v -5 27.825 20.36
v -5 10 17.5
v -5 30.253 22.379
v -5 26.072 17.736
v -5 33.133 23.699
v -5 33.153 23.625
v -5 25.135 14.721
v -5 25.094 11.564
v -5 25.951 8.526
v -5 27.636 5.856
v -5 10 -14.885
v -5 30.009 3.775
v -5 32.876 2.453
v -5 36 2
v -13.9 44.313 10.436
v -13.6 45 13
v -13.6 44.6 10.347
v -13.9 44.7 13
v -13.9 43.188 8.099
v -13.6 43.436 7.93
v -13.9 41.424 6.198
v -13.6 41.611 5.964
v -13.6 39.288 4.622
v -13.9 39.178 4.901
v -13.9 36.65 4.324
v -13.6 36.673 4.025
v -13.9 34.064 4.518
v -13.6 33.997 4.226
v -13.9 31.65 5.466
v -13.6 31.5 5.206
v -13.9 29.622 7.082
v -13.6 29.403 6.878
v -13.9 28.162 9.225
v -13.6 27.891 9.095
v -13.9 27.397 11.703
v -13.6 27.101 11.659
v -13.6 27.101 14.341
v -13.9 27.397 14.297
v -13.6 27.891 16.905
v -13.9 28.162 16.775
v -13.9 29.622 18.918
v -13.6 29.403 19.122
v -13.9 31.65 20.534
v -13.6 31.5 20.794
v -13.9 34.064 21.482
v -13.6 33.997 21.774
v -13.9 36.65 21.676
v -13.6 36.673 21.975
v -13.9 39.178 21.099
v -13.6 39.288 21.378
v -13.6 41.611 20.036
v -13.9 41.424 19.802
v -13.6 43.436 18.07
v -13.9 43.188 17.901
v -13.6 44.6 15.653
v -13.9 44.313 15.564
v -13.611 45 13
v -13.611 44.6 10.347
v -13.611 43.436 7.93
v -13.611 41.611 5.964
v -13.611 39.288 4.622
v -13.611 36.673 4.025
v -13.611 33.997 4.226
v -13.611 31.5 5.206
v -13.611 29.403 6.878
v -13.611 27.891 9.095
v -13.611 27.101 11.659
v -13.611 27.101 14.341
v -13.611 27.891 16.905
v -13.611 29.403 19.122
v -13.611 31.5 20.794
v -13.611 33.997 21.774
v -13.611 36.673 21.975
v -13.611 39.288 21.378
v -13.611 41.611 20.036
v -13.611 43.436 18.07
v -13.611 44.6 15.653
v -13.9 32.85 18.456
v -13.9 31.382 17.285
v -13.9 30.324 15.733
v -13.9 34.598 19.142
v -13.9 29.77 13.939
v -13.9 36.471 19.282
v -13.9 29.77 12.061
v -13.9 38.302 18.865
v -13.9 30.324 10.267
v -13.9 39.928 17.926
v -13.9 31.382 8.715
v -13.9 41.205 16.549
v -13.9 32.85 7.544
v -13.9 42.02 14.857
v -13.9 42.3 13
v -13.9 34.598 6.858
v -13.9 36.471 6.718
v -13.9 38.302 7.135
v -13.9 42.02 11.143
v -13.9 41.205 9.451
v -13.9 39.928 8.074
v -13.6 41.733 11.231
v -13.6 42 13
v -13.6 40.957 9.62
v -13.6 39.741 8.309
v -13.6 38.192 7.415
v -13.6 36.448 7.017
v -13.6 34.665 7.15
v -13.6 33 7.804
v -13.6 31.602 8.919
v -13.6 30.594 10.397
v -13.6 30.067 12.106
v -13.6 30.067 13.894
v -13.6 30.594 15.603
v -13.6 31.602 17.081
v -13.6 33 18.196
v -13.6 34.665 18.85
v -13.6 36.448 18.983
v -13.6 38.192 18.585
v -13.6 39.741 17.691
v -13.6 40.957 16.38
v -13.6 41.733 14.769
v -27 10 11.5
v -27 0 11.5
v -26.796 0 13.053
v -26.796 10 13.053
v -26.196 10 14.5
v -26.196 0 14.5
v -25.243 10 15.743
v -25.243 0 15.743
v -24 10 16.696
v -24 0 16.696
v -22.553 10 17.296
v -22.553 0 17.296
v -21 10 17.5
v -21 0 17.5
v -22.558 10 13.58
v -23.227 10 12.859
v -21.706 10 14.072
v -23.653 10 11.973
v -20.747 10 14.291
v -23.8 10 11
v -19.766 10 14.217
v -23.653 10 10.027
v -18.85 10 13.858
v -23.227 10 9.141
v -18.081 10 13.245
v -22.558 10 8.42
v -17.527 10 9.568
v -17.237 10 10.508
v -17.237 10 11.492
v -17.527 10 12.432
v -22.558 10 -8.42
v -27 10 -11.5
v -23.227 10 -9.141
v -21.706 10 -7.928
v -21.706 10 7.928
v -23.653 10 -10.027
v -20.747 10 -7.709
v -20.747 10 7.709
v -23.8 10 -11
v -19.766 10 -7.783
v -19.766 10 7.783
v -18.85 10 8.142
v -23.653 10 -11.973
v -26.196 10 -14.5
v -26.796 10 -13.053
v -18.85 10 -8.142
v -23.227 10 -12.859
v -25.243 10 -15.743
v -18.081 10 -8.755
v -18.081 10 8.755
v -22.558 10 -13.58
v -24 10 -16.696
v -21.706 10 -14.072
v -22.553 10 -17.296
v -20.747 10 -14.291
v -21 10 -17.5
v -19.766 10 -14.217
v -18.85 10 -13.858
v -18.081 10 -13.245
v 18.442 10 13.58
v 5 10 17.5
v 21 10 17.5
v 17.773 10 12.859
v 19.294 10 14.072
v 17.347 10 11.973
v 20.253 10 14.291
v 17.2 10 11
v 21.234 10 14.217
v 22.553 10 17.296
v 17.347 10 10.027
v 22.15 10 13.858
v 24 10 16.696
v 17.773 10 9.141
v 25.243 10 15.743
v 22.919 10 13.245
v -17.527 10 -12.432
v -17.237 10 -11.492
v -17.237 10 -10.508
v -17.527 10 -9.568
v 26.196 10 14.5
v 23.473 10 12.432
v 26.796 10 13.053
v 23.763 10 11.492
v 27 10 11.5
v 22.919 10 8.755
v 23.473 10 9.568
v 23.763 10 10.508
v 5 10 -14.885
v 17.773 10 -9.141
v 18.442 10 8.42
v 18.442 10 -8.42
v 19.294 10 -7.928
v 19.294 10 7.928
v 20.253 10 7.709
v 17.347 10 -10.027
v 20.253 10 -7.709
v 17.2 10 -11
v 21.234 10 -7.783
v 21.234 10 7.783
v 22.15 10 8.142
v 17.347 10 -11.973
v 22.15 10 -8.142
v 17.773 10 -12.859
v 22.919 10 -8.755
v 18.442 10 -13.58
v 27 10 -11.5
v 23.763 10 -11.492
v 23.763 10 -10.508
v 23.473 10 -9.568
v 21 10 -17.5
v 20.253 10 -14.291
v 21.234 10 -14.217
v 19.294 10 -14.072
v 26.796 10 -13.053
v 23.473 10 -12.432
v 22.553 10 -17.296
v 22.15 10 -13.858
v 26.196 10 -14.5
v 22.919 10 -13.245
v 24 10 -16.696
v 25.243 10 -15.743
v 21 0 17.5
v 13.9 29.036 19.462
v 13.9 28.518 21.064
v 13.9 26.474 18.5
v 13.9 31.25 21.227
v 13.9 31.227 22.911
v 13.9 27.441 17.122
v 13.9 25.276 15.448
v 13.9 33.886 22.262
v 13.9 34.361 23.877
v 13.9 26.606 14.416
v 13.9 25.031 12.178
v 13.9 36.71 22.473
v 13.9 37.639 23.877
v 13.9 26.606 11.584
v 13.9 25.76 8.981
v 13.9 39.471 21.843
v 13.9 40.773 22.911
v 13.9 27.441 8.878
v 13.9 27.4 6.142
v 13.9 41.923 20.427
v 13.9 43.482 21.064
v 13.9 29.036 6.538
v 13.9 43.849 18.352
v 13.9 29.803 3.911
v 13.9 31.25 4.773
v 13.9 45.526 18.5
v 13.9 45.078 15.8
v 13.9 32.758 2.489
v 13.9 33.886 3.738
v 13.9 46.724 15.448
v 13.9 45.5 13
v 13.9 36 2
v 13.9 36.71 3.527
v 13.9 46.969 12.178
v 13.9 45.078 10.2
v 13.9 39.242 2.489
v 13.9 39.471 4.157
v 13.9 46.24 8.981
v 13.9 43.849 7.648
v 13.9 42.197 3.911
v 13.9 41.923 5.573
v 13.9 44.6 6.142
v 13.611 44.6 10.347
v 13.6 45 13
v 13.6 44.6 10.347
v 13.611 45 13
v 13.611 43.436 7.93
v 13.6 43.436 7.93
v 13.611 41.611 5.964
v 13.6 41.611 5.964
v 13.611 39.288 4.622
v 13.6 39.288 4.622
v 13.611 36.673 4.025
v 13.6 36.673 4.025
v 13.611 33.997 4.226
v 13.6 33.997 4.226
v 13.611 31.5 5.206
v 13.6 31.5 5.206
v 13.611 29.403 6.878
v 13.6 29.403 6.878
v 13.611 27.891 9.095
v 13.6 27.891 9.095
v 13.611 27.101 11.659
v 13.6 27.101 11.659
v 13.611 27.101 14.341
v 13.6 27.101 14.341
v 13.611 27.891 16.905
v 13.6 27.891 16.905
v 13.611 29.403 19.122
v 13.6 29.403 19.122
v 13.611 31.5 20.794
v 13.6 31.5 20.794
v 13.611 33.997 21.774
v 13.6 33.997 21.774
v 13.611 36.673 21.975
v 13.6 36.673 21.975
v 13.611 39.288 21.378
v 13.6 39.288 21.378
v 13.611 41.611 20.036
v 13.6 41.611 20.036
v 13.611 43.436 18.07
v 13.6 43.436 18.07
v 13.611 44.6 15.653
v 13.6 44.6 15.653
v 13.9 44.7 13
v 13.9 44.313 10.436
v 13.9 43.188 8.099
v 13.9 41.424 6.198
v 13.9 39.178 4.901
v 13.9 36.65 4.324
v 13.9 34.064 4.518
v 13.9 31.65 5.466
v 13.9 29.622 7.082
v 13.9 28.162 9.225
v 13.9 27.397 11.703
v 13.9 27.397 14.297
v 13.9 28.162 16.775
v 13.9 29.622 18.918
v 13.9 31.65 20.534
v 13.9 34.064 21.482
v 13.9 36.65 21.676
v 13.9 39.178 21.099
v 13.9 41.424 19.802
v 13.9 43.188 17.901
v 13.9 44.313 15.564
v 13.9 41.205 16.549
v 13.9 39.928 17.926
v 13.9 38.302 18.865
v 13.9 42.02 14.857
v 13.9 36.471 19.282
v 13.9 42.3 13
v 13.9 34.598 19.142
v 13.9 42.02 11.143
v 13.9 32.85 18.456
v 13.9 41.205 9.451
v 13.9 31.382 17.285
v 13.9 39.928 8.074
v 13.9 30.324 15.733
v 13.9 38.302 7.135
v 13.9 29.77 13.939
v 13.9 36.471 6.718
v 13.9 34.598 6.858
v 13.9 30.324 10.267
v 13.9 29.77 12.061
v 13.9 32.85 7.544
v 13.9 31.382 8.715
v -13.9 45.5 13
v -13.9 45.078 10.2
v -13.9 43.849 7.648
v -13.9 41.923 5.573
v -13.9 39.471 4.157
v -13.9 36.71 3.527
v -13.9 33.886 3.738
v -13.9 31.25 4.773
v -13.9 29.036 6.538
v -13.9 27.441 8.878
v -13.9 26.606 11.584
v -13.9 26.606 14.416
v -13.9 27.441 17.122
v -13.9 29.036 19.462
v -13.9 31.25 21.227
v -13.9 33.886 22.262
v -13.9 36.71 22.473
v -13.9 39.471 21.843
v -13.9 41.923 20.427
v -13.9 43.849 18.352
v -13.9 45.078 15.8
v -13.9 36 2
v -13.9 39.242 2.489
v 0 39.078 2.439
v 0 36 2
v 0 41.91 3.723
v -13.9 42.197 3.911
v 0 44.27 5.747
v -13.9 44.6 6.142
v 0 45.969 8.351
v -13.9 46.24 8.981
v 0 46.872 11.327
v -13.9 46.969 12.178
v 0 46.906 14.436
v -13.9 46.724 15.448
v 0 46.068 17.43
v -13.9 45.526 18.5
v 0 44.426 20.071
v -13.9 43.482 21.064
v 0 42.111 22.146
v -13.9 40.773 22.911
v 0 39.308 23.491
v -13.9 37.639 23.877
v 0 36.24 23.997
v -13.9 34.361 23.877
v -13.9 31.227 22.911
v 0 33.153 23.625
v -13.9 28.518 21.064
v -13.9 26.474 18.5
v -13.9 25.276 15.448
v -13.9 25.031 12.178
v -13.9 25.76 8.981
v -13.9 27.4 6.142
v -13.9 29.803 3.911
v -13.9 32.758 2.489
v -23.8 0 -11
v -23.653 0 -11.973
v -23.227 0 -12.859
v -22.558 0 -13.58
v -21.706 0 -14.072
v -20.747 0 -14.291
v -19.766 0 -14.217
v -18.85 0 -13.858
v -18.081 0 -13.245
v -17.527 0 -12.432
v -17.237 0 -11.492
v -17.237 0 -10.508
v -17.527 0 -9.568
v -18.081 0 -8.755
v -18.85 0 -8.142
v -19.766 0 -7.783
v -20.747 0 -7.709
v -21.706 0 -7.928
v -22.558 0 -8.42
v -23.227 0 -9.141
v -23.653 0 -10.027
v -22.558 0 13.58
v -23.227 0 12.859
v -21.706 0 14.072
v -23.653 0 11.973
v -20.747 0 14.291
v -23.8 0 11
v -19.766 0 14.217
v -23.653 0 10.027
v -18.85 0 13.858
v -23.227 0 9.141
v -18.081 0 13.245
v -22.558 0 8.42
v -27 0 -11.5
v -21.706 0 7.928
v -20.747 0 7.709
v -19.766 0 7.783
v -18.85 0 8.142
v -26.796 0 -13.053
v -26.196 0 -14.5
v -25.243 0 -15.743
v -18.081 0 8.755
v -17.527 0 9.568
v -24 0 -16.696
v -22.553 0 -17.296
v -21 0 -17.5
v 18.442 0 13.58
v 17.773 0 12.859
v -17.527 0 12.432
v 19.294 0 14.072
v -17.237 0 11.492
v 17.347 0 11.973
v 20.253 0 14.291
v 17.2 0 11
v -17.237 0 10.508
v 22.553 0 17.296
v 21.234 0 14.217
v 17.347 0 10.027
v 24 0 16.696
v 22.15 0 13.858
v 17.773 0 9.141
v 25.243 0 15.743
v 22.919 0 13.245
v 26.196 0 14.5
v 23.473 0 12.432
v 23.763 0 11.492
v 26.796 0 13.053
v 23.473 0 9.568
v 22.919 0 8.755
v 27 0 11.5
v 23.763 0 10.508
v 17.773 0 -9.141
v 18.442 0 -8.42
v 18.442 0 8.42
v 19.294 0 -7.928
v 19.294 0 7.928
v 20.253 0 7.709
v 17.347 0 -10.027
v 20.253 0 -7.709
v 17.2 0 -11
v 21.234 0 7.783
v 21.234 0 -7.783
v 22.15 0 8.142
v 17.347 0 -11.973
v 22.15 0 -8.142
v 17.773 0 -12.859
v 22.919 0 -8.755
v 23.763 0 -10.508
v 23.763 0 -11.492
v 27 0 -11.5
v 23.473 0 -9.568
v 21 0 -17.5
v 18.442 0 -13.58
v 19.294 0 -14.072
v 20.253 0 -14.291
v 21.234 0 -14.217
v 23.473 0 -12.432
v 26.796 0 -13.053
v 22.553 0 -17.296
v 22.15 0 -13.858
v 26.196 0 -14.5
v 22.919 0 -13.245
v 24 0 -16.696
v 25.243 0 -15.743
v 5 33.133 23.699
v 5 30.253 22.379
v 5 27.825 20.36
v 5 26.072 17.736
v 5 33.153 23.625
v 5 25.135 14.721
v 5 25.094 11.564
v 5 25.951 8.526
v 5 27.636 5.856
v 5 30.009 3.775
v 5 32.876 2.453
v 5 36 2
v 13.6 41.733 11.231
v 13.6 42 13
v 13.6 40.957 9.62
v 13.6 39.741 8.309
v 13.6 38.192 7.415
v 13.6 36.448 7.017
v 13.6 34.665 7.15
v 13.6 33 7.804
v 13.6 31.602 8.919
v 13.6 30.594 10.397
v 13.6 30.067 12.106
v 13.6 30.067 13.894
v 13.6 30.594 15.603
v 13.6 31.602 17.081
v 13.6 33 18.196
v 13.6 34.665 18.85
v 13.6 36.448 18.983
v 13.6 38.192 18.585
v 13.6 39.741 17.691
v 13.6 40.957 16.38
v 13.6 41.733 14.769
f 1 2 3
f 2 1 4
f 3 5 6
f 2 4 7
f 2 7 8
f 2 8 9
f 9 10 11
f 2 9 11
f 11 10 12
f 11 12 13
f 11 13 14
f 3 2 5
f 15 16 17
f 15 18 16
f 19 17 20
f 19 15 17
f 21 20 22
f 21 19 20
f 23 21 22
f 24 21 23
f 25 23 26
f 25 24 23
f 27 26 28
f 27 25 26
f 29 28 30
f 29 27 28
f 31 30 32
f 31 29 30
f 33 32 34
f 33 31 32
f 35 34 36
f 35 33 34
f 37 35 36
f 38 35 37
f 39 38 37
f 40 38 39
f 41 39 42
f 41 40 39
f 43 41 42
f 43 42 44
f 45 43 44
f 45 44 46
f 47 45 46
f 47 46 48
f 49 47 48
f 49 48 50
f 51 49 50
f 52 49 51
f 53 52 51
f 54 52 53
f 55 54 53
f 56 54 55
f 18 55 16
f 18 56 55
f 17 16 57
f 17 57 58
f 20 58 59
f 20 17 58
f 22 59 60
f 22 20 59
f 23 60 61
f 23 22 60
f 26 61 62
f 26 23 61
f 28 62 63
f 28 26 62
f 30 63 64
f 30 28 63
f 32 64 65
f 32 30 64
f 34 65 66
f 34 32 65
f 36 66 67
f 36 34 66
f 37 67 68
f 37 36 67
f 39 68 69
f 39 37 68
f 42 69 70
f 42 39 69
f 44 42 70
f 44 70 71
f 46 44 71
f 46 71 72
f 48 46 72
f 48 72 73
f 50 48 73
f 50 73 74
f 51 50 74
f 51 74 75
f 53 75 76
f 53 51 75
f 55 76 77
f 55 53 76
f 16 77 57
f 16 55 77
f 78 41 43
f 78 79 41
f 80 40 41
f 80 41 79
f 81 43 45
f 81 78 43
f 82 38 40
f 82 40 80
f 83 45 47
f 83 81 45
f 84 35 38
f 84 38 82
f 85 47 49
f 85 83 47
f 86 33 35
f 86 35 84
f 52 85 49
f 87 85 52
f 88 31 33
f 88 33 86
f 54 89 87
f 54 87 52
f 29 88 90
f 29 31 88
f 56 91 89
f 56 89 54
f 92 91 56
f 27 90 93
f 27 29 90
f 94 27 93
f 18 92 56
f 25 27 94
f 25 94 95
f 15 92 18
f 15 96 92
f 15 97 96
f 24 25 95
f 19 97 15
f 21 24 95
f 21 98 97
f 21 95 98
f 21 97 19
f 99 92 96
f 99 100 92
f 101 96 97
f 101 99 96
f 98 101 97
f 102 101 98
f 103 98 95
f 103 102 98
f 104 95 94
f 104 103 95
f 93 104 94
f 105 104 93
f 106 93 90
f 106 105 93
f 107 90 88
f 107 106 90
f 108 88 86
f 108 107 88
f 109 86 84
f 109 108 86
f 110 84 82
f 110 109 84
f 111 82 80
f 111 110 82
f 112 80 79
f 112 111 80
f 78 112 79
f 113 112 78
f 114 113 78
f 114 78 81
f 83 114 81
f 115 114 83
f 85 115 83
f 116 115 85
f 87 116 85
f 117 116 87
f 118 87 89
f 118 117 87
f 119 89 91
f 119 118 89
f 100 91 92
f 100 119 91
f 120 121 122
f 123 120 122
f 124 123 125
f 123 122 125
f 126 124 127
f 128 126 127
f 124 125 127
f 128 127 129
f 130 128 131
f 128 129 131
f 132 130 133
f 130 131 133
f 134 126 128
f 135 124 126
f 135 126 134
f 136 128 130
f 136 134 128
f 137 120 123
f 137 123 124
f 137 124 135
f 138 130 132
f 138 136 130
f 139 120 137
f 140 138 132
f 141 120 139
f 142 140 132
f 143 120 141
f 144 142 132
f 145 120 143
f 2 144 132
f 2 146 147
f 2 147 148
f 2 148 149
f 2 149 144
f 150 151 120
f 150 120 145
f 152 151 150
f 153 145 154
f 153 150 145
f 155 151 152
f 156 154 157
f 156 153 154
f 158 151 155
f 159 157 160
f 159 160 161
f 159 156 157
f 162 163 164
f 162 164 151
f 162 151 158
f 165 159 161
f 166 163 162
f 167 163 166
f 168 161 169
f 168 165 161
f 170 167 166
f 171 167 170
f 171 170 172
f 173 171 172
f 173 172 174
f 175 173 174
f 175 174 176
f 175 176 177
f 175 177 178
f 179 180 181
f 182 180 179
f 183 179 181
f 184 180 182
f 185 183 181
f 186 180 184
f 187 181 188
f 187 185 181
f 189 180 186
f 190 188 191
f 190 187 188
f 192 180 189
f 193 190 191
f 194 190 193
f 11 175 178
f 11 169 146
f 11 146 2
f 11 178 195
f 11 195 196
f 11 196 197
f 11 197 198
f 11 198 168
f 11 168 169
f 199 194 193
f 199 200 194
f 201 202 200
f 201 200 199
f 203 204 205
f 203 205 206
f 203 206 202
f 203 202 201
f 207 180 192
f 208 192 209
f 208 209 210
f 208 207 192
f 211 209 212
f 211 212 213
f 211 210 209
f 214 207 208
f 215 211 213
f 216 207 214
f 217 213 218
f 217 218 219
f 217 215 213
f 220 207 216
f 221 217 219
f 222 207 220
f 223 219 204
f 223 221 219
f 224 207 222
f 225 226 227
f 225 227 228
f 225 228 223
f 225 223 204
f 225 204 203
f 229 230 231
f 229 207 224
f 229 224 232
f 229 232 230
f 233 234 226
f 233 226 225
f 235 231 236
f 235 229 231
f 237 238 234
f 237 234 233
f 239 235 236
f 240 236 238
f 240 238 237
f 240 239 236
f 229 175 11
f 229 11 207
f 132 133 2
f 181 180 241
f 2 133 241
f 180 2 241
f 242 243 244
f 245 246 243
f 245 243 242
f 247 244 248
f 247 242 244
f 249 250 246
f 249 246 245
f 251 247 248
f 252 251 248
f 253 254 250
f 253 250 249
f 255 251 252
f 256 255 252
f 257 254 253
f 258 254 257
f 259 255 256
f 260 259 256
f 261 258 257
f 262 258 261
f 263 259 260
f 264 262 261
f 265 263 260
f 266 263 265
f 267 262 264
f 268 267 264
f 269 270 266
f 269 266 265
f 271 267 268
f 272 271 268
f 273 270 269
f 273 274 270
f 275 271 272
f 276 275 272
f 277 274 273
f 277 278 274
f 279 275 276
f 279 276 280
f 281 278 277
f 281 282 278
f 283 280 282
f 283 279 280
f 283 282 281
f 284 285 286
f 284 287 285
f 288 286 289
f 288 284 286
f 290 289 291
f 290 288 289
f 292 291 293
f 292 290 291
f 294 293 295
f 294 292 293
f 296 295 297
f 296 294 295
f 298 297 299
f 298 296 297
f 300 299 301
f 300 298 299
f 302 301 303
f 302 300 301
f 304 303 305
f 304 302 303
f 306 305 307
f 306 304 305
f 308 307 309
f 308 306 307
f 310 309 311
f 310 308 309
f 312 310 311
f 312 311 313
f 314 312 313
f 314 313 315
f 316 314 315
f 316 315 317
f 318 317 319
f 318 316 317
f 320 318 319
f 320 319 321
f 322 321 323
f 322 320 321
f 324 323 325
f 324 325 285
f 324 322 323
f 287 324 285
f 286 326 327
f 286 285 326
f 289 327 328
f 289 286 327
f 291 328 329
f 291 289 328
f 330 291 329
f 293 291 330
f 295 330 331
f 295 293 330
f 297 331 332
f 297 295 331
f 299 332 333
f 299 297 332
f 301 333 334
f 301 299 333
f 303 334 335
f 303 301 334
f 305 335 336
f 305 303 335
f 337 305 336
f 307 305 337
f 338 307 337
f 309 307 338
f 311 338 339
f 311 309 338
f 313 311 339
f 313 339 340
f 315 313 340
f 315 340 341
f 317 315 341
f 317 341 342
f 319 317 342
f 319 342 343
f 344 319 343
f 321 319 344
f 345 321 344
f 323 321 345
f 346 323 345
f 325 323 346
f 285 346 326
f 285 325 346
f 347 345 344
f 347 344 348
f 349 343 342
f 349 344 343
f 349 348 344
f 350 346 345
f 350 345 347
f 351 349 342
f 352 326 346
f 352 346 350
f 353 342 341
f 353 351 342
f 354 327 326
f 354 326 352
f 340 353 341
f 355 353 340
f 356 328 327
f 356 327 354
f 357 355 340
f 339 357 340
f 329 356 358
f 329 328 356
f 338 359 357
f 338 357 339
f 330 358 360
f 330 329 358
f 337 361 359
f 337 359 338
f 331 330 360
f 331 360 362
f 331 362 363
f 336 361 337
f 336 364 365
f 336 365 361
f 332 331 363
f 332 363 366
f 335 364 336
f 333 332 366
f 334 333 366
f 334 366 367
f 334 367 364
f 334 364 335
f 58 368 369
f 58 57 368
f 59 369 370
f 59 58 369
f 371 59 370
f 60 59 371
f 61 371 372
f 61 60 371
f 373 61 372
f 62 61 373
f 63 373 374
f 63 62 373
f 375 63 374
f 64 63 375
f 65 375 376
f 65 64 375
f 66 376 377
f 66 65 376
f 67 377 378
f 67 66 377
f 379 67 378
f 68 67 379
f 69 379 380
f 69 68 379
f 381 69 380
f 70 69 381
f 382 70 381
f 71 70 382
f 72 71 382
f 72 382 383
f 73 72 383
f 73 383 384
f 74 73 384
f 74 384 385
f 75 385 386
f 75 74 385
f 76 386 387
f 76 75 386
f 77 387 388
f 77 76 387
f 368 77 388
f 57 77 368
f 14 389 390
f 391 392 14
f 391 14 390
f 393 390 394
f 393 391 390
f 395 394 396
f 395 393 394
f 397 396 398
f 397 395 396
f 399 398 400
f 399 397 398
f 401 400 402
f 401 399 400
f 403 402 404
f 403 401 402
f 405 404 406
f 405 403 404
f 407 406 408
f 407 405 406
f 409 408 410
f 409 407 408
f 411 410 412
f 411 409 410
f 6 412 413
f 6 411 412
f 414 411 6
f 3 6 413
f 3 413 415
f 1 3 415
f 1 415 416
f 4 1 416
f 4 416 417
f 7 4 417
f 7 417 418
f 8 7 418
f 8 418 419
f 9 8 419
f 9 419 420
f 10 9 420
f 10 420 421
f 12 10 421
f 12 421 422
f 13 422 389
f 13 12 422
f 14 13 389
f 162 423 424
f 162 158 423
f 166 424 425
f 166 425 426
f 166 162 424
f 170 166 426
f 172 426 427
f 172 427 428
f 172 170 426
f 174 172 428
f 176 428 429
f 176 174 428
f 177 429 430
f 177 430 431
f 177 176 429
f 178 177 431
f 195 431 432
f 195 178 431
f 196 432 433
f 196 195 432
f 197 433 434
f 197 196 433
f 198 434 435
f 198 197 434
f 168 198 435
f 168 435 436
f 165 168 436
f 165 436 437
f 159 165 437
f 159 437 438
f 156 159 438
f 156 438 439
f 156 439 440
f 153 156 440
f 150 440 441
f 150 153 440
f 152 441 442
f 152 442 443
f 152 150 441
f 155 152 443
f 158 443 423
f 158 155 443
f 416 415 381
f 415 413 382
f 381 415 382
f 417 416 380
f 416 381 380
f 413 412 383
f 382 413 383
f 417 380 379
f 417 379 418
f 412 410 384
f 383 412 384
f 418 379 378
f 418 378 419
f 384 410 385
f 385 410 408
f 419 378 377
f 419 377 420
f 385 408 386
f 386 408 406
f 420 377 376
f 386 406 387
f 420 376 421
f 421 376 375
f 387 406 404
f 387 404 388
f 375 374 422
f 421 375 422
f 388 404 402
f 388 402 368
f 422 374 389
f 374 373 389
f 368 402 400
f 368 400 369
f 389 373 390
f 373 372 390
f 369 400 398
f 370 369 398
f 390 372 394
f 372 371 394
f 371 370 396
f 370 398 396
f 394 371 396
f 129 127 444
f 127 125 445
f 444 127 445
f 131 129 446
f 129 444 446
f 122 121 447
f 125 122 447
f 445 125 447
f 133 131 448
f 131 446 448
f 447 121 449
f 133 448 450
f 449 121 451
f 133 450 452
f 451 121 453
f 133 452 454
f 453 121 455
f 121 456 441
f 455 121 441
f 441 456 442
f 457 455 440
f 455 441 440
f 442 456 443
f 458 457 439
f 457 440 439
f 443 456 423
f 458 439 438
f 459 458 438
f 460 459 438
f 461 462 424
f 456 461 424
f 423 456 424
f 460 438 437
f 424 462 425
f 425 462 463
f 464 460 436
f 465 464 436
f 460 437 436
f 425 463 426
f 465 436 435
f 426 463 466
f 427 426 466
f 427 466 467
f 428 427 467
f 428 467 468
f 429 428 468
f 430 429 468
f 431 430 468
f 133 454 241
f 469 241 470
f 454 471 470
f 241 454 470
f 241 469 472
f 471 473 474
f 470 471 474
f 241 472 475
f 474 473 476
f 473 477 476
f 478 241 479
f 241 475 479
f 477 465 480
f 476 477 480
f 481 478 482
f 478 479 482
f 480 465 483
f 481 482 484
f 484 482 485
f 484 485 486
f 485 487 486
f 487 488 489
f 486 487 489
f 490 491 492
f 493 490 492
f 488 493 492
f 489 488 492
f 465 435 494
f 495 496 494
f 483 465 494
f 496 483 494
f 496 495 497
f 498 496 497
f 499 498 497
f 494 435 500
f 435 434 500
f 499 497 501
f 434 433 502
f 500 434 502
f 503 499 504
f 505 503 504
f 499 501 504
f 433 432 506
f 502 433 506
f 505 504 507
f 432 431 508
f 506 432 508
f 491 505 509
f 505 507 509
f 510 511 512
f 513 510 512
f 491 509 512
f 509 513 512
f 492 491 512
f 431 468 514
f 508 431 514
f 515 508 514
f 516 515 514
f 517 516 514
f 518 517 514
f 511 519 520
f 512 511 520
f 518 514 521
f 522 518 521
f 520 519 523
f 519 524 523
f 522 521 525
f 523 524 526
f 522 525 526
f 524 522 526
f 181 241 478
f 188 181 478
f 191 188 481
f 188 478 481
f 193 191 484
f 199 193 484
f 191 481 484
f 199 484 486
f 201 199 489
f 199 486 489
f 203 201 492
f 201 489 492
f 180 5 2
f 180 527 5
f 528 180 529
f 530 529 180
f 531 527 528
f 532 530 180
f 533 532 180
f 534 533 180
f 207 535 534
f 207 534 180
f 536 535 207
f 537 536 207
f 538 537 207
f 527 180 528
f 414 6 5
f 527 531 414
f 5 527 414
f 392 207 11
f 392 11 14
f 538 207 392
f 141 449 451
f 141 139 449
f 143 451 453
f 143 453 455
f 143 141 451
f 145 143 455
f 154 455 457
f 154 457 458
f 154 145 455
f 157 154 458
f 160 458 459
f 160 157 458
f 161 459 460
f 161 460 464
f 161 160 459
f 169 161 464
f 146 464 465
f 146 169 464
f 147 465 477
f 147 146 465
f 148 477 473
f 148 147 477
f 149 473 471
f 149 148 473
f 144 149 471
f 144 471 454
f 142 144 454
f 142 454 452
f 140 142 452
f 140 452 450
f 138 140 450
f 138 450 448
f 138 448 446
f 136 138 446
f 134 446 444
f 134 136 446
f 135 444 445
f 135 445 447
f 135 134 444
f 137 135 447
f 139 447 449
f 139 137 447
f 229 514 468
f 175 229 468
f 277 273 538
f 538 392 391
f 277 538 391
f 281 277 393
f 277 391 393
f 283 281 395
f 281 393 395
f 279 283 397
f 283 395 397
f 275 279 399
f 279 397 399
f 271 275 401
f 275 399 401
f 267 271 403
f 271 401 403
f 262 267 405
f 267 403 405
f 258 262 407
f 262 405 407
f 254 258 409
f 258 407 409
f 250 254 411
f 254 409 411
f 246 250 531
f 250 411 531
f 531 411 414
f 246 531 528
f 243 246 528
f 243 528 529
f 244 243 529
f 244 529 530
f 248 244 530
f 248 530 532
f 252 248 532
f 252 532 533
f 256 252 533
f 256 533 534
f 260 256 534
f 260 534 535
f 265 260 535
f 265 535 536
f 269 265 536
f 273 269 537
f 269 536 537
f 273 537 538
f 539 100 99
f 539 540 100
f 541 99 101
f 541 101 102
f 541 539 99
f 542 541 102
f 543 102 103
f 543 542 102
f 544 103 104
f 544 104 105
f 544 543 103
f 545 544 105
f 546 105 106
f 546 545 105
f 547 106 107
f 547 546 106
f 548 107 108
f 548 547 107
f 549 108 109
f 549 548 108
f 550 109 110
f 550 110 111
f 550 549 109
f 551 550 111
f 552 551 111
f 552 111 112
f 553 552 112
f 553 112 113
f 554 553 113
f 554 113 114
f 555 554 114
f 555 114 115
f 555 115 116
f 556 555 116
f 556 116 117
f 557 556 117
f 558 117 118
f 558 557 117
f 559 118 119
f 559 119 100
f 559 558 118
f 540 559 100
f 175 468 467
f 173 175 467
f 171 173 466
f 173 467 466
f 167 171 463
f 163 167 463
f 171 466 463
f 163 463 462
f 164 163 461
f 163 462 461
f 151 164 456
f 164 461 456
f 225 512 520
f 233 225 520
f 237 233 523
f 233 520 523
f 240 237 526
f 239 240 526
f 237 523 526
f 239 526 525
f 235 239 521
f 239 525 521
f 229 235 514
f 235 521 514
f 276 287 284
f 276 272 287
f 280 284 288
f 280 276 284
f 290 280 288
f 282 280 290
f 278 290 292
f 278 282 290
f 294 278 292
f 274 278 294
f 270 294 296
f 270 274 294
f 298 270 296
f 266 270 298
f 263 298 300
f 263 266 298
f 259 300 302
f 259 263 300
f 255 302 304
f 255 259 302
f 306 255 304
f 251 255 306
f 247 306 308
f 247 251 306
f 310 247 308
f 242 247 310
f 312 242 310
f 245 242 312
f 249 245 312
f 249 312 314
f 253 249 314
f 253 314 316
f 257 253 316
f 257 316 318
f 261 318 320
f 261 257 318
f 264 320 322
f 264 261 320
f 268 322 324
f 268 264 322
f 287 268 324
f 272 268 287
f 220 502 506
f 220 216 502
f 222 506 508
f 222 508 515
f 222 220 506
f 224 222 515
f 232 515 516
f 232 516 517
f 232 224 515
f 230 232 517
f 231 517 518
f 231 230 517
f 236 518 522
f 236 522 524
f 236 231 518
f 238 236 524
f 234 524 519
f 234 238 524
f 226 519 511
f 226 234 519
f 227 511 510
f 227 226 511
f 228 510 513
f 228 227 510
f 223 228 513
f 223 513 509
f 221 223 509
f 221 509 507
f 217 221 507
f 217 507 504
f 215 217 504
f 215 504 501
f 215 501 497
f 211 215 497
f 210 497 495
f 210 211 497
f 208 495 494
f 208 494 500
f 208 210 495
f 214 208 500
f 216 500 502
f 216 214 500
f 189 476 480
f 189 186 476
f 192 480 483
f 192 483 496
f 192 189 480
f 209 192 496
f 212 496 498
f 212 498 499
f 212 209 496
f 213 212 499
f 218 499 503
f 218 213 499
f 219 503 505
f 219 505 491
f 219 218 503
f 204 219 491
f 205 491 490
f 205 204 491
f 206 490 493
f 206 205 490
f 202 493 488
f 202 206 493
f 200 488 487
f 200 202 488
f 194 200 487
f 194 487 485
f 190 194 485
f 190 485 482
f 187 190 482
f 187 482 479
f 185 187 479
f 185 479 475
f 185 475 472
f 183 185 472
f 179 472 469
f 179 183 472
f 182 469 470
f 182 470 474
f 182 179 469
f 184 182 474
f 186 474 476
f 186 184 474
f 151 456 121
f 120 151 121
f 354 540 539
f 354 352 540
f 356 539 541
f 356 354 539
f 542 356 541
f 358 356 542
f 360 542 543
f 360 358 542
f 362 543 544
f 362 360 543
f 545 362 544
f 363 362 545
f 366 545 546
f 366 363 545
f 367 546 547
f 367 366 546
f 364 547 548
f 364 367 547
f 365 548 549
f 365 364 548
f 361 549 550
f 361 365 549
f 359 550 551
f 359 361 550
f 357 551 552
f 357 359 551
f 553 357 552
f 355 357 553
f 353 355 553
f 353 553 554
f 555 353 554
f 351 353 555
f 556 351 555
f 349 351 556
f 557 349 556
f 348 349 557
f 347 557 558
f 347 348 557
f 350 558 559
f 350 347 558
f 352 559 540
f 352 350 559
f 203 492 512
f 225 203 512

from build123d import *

# Parameters (mm, degrees)
BOSS_EXTRUDE1_DEPTH      = 10
BOSS_EXTRUDE2_DEPTH      = 5
BOSS_EXTRUDE2_DEPTH_BACK = 5
SKETCH3_R                = 11
BOSS_EXTRUDE3_DEPTH      = 13.9
BOSS_EXTRUDE3_DEPTH_BACK = 13.9
SKETCH4_W                = 3.3
SKETCH4_H                = 10
SKETCH5_W                = 3.3
SKETCH5_H                = 10
SKETCH6_W                = 3.3
SKETCH6_H                = 10
SKETCH7_W                = 3.3
SKETCH7_H                = 10


with BuildPart() as part:
    # Sketch1 → Boss-Extrude1 (new body)
    with BuildSketch(Plane(origin=(0, 0, 0), x_dir=(1, 0, 0), z_dir=(0, 1, 0))):
        with BuildLine():
            Line((-21, -17.5), (21, -17.5))
            ThreePointArc((21, -17.5), (25.242640687, -15.742640687), (27, -11.5))
            Line((27, -11.5), (27, 11.5))
            ThreePointArc((27, 11.5), (25.242640687, 15.742640687), (21, 17.5))
            Line((21, 17.5), (-21, 17.5))
            ThreePointArc((-21, 17.5), (-25.242640687, 15.742640687), (-27, 11.5))
            Line((-27, 11.5), (-27, -11.5))
            ThreePointArc((-27, -11.5), (-25.242640687, -15.742640687), (-21, -17.5))
        make_face()
    extrude(amount=BOSS_EXTRUDE1_DEPTH)

    # Sketch2 → Boss-Extrude2 (add, two sides)
    with BuildSketch(Plane(origin=(0, 0, 0), x_dir=(0, 0, -1), z_dir=(1, 0, 0))) as boss_extrude2_sk:
        Polygon((-23.698557159, 33.133330249), (-17.5, 10), (14.884597423, 10), (-3.630389444, 38.510579582), align=None)
    extrude(amount=BOSS_EXTRUDE2_DEPTH)
    extrude(boss_extrude2_sk.sketch, amount=-BOSS_EXTRUDE2_DEPTH_BACK)

    # Sketch3 → Boss-Extrude3 (add, two sides)
    with BuildSketch(Plane(origin=(0, 0, 0), x_dir=(0, 0, -1), z_dir=(1, 0, 0))) as boss_extrude3_sk:
        with Locations((-13, 36)):
            Circle(SKETCH3_R)
    extrude(amount=BOSS_EXTRUDE3_DEPTH)
    extrude(boss_extrude3_sk.sketch, amount=-BOSS_EXTRUDE3_DEPTH_BACK)

    # Sketch4 → Cut-Revolve1 (revolve, cut)
    with BuildSketch(Plane.XY.offset(11)):
        with Locations((-22.15, 5)):
            Rectangle(SKETCH4_W, SKETCH4_H)
    revolve(axis=Axis((-20.5, 10, 11), (0, -1, 0)), mode=Mode.SUBTRACT)

    # Sketch5 → Cut-Revolve2 (revolve, cut)
    with BuildSketch(Plane.XY.offset(11)):
        with Locations((18.85, 5)):
            Rectangle(SKETCH5_W, SKETCH5_H)
    revolve(axis=Axis((20.5, 10, 11), (0, -1, 0)), mode=Mode.SUBTRACT)

    # Sketch6 → Cut-Revolve3 (revolve, cut)
    with BuildSketch(Plane.XY.offset(-11)):
        with Locations((-22.15, 5)):
            Rectangle(SKETCH6_W, SKETCH6_H)
    revolve(axis=Axis((-20.5, 10, -11), (0, -1, 0)), mode=Mode.SUBTRACT)

    # Sketch7 → Cut-Revolve4 (revolve, cut)
    with BuildSketch(Plane.XY.offset(-11)):
        with Locations((18.85, 5)):
            Rectangle(SKETCH7_W, SKETCH7_H)
    revolve(axis=Axis((20.5, 10, -11), (0, -1, 0)), mode=Mode.SUBTRACT)

    # Sketch8 → Cut-Revolve5 (revolve, cut)
    with BuildSketch(Plane.XY.offset(13)):
        Polygon((-13.9, 36), (-13.9, 45.5), (-13.611324865, 45), (13.611324865, 45), (13.9, 45.5), (13.9, 36), align=None)
    revolve(axis=Axis((13.9, 36, 13), (-1, 0, 0)), mode=Mode.SUBTRACT)

    # Sketch9 → Revolve1 (revolve)
    with BuildSketch(Plane.XY.offset(13)):
        Polygon((-13.9, 42.3), (-13.6, 42), (13.6, 42), (13.9, 42.3), (13.9, 44.7), (13.6, 45), (-13.6, 45), (-13.9, 44.7), align=None)
    revolve(axis=Axis((13.9, 36, 13), (-1, 0, 0)))


solid = part.part
